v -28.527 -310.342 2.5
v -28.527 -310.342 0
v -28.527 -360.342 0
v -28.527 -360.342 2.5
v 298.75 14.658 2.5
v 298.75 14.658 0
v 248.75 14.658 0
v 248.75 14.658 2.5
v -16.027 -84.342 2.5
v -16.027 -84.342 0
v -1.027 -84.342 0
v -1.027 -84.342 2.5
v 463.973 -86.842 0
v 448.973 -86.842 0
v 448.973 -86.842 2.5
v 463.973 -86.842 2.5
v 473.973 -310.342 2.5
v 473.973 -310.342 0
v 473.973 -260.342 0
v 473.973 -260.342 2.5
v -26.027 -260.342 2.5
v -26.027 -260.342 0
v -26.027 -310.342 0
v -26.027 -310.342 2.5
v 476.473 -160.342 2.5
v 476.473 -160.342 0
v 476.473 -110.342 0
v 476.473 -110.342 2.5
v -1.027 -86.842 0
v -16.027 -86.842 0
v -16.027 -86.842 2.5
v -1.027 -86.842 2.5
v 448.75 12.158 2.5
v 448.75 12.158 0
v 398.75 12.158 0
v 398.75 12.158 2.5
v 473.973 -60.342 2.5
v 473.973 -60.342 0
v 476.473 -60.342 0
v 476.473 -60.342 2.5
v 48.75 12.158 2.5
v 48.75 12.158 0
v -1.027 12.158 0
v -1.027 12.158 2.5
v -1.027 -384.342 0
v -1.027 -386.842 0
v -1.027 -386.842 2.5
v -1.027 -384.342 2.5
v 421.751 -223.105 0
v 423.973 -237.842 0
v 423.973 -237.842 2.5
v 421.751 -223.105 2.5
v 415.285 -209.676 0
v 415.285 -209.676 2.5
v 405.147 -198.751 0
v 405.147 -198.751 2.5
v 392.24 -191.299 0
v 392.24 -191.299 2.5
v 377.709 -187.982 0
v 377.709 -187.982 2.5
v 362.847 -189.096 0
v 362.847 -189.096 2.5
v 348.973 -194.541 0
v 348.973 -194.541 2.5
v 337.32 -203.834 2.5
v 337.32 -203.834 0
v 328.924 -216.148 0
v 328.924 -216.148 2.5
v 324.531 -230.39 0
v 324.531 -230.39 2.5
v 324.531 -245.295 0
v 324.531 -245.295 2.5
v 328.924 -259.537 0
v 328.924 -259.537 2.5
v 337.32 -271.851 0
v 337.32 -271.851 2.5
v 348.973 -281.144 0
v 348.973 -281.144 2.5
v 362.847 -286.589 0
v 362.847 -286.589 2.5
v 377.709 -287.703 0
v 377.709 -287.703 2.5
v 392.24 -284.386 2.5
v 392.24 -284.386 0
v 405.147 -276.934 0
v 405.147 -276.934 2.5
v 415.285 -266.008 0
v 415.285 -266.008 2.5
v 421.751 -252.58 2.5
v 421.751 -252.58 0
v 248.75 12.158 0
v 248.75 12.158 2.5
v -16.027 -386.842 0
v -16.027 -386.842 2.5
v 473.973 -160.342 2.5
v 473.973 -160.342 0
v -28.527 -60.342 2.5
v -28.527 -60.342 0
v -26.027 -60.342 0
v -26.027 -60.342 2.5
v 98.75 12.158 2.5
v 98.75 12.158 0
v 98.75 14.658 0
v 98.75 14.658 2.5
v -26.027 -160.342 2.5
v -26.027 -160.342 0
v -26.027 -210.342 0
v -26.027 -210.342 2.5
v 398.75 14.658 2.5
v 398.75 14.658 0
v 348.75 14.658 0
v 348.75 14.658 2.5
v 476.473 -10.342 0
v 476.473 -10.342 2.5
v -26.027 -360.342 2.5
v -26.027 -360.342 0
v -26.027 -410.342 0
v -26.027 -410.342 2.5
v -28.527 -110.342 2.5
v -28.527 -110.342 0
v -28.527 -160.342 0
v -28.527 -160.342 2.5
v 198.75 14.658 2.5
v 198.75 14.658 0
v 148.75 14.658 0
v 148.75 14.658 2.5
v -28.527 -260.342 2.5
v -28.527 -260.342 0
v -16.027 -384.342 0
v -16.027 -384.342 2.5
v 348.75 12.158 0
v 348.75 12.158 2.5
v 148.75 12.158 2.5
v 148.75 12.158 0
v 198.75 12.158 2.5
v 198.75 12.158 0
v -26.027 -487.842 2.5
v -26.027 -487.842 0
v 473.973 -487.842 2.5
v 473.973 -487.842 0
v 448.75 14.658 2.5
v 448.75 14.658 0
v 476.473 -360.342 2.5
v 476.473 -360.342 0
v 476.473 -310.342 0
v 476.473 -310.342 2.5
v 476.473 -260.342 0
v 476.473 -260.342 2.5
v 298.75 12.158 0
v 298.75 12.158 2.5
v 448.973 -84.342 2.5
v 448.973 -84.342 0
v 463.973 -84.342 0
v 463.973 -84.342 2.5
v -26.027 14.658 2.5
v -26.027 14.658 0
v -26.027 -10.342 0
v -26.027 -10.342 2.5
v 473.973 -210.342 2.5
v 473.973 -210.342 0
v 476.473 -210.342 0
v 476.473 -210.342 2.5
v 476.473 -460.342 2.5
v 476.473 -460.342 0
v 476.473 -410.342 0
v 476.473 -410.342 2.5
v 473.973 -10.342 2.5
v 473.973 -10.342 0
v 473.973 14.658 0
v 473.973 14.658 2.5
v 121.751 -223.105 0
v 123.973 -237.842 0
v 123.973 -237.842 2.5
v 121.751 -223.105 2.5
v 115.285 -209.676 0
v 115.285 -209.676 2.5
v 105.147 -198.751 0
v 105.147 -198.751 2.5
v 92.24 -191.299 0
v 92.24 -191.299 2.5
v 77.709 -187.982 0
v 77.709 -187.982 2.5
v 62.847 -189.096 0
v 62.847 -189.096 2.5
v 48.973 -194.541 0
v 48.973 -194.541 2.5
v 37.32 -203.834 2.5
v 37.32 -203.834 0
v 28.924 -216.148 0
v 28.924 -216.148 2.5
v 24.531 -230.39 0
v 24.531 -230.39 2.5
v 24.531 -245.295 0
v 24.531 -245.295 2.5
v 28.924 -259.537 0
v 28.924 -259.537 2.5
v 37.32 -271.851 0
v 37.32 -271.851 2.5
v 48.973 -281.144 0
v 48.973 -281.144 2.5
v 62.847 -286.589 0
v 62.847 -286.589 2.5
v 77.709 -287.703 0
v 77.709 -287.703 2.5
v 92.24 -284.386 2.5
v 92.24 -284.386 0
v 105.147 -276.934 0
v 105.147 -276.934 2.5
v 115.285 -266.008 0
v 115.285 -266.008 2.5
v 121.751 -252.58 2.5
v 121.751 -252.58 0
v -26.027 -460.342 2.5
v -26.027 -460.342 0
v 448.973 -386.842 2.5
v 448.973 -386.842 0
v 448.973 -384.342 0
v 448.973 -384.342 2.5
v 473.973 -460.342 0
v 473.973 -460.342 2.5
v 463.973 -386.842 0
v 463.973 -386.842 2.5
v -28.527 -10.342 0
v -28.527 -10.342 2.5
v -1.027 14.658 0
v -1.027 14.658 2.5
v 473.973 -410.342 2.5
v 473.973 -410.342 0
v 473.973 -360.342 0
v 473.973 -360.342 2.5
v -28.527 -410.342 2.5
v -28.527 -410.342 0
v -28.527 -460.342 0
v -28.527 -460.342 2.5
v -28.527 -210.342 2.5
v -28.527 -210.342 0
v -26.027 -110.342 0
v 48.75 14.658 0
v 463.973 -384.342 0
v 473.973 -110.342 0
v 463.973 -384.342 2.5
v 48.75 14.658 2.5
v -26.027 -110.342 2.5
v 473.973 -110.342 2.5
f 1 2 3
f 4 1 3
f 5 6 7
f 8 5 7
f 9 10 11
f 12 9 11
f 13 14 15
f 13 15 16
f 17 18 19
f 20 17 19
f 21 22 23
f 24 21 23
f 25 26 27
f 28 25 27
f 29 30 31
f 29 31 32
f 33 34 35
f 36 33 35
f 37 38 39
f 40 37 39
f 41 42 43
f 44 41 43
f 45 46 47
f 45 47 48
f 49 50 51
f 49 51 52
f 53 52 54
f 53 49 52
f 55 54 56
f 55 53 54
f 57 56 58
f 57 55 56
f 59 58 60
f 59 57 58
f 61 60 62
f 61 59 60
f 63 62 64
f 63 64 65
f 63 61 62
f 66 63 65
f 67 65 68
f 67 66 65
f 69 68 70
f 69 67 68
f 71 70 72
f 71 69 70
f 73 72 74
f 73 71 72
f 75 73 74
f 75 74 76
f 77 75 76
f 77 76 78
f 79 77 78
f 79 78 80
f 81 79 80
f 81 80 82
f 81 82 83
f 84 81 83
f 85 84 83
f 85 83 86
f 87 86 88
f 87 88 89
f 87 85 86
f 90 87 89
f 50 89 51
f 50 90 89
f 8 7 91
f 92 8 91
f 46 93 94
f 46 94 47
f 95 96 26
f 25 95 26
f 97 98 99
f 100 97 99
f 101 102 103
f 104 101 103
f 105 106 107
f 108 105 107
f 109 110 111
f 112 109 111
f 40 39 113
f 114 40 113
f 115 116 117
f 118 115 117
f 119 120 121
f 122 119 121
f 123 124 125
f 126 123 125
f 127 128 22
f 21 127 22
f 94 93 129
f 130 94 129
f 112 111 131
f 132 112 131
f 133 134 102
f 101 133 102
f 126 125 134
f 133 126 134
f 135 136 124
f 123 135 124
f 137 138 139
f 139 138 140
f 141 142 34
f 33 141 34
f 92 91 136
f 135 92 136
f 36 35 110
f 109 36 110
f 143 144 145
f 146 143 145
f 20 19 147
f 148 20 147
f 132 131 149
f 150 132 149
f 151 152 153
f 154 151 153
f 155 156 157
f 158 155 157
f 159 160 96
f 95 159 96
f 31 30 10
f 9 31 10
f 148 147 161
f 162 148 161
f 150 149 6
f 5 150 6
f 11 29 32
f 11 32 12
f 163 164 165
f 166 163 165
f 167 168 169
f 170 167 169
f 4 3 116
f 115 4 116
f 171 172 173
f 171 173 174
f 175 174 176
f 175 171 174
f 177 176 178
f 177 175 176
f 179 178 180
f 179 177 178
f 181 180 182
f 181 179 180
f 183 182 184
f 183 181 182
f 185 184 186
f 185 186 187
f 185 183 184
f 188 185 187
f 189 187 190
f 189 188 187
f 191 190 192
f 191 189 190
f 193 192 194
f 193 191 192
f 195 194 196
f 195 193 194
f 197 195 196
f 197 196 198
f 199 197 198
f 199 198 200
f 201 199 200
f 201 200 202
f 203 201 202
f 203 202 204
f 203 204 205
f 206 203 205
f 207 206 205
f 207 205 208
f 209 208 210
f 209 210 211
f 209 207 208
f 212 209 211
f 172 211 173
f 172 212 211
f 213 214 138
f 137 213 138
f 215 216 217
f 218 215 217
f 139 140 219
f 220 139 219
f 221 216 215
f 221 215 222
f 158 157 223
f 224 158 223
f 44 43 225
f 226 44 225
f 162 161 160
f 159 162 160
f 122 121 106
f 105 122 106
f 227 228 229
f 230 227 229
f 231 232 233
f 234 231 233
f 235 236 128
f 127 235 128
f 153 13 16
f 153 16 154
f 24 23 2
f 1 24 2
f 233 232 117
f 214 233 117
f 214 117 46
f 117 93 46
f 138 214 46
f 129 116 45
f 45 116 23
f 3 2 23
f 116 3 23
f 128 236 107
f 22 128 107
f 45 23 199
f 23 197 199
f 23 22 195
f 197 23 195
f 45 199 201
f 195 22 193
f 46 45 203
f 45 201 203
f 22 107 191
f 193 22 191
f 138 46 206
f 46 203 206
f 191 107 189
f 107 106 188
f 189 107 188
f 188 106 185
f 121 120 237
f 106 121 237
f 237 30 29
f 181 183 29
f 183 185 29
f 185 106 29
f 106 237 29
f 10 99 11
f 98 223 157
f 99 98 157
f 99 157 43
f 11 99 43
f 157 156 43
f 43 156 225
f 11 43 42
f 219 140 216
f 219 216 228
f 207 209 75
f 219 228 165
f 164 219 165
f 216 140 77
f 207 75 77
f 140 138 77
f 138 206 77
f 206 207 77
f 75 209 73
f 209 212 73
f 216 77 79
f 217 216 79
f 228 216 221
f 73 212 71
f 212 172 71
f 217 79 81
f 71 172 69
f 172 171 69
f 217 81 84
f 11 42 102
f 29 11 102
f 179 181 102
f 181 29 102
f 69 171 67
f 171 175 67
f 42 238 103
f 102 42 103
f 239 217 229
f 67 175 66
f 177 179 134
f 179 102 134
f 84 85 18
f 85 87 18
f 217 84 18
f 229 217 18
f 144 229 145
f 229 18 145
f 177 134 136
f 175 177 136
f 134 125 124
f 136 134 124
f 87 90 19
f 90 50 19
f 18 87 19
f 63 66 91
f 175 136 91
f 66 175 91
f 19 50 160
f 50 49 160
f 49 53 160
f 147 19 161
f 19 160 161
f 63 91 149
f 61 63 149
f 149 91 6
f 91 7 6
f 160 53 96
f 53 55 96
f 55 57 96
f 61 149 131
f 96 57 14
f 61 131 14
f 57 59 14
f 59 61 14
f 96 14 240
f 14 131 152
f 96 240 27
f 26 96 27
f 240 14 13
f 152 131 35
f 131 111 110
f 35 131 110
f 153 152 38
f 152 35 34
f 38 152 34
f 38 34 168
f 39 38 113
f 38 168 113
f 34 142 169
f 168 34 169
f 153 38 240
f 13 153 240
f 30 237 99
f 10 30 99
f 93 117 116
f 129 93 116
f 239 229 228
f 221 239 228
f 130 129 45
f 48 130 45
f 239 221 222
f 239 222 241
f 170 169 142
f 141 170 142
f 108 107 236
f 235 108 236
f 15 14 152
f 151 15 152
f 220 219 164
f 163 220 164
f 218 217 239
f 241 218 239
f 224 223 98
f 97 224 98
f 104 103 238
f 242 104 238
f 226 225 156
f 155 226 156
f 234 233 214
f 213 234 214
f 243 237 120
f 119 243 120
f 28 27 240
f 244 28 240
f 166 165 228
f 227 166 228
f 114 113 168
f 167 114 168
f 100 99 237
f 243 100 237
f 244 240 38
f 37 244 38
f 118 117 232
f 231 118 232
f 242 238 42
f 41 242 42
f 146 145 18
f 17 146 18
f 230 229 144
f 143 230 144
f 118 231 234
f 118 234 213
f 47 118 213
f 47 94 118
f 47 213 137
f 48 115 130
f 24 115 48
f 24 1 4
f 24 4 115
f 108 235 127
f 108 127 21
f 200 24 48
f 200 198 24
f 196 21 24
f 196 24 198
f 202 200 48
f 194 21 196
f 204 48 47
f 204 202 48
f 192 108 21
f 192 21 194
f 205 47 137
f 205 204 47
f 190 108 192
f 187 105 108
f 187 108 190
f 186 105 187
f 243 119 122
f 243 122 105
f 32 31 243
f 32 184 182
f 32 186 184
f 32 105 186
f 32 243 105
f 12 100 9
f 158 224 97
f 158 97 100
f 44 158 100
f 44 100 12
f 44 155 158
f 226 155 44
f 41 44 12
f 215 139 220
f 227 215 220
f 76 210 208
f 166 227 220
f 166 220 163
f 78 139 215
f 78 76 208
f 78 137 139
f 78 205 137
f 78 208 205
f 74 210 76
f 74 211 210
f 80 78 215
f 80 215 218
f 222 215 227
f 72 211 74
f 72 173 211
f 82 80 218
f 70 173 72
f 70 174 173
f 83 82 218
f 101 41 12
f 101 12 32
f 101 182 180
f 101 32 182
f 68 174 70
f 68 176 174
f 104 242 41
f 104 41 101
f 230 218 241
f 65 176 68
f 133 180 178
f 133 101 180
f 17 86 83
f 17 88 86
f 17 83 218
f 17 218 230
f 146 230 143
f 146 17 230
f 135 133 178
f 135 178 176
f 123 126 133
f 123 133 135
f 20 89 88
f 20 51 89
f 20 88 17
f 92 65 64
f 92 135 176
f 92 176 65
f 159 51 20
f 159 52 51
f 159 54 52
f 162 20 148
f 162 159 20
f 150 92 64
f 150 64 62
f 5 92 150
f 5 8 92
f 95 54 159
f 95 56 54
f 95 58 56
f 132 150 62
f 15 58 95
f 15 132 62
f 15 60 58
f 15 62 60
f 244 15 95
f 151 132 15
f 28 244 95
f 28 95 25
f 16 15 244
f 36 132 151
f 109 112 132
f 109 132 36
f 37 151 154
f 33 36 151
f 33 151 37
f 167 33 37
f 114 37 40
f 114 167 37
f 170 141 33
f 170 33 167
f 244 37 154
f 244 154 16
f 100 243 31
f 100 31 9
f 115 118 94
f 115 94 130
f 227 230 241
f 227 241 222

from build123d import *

# Parameters (mm, degrees)
SKETCH1_W           = 15
SKETCH1_H           = 2.5
SKETCH1_R           = 50
BOSS_EXTRUDE1_DEPTH = 2.5


with BuildPart() as part:
    # Sketch1 → Boss-Extrude1 (new body)
    with BuildSketch(Plane.XY):
        Polygon((473.97260274, -110.342465753), (473.97260274, -60.342465753), (476.47260274, -60.342465753), (476.47260274, -10.342465753), (473.97260274, -10.342465753), (473.97260274, 14.657534247), (448.750266435, 14.657534247), (448.750266435, 12.157534247), (398.750266435, 12.157534247), (398.750266435, 14.657534247), (348.750266435, 14.657534247), (348.750266435, 12.157534247), (298.750266435, 12.157534247), (298.750266435, 14.657534247), (248.750266435, 14.657534247), (248.750266435, 12.157534247), (198.750266435, 12.157534247), (198.750266435, 14.657534247), (148.750266435, 14.657534247), (148.750266435, 12.157534247), (98.750266435, 12.157534247), (98.750266435, 14.657534247), (48.750266435, 14.657534247), (48.750266435, 12.157534247), (-1.02739726, 12.157534247), (-1.02739726, 14.657534247), (-26.02739726, 14.657534247), (-26.02739726, -10.342465753), (-28.52739726, -10.342465753), (-28.52739726, -60.342465753), (-26.02739726, -60.342465753), (-26.02739726, -110.342465753), (-28.52739726, -110.342465753), (-28.52739726, -160.342465753), (-26.02739726, -160.342465753), (-26.02739726, -210.342465753), (-28.52739726, -210.342465753), (-28.52739726, -260.342465753), (-26.02739726, -260.342465753), (-26.02739726, -310.342465753), (-28.52739726, -310.342465753), (-28.52739726, -360.342465753), (-26.02739726, -360.342465753), (-26.02739726, -410.342465753), (-28.52739726, -410.342465753), (-28.52739726, -460.342465753), (-26.02739726, -460.342465753), (-26.02739726, -487.842465753), (473.97260274, -487.842465753), (473.97260274, -460.342465753), (476.47260274, -460.342465753), (476.47260274, -410.342465753), (473.97260274, -410.342465753), (473.97260274, -360.342465753), (476.47260274, -360.342465753), (476.47260274, -310.342465753), (473.97260274, -310.342465753), (473.97260274, -260.342465753), (476.47260274, -260.342465753), (476.47260274, -210.342465753), (473.97260274, -210.342465753), (473.97260274, -160.342465753), (476.47260274, -160.342465753), (476.47260274, -110.342465753), align=None)
        with Locations((-8.52739726, -385.592465753)):
            Rectangle(SKETCH1_W, SKETCH1_H, mode=Mode.SUBTRACT)
        with Locations((73.97260274, -237.842465753)):
            Circle(SKETCH1_R, mode=Mode.SUBTRACT)
        with Locations((456.47260274, -385.592465753)):
            Rectangle(SKETCH1_W, SKETCH1_H, mode=Mode.SUBTRACT)
        with Locations((373.97260274, -237.842465753)):
            Circle(SKETCH1_R, mode=Mode.SUBTRACT)
        with Locations((-8.52739726, -85.592465753)):
            Rectangle(SKETCH1_W, SKETCH1_H, mode=Mode.SUBTRACT)
        with Locations((456.47260274, -85.592465753)):
            Rectangle(SKETCH1_W, SKETCH1_H, mode=Mode.SUBTRACT)
    extrude(amount=BOSS_EXTRUDE1_DEPTH)


solid = part.part
